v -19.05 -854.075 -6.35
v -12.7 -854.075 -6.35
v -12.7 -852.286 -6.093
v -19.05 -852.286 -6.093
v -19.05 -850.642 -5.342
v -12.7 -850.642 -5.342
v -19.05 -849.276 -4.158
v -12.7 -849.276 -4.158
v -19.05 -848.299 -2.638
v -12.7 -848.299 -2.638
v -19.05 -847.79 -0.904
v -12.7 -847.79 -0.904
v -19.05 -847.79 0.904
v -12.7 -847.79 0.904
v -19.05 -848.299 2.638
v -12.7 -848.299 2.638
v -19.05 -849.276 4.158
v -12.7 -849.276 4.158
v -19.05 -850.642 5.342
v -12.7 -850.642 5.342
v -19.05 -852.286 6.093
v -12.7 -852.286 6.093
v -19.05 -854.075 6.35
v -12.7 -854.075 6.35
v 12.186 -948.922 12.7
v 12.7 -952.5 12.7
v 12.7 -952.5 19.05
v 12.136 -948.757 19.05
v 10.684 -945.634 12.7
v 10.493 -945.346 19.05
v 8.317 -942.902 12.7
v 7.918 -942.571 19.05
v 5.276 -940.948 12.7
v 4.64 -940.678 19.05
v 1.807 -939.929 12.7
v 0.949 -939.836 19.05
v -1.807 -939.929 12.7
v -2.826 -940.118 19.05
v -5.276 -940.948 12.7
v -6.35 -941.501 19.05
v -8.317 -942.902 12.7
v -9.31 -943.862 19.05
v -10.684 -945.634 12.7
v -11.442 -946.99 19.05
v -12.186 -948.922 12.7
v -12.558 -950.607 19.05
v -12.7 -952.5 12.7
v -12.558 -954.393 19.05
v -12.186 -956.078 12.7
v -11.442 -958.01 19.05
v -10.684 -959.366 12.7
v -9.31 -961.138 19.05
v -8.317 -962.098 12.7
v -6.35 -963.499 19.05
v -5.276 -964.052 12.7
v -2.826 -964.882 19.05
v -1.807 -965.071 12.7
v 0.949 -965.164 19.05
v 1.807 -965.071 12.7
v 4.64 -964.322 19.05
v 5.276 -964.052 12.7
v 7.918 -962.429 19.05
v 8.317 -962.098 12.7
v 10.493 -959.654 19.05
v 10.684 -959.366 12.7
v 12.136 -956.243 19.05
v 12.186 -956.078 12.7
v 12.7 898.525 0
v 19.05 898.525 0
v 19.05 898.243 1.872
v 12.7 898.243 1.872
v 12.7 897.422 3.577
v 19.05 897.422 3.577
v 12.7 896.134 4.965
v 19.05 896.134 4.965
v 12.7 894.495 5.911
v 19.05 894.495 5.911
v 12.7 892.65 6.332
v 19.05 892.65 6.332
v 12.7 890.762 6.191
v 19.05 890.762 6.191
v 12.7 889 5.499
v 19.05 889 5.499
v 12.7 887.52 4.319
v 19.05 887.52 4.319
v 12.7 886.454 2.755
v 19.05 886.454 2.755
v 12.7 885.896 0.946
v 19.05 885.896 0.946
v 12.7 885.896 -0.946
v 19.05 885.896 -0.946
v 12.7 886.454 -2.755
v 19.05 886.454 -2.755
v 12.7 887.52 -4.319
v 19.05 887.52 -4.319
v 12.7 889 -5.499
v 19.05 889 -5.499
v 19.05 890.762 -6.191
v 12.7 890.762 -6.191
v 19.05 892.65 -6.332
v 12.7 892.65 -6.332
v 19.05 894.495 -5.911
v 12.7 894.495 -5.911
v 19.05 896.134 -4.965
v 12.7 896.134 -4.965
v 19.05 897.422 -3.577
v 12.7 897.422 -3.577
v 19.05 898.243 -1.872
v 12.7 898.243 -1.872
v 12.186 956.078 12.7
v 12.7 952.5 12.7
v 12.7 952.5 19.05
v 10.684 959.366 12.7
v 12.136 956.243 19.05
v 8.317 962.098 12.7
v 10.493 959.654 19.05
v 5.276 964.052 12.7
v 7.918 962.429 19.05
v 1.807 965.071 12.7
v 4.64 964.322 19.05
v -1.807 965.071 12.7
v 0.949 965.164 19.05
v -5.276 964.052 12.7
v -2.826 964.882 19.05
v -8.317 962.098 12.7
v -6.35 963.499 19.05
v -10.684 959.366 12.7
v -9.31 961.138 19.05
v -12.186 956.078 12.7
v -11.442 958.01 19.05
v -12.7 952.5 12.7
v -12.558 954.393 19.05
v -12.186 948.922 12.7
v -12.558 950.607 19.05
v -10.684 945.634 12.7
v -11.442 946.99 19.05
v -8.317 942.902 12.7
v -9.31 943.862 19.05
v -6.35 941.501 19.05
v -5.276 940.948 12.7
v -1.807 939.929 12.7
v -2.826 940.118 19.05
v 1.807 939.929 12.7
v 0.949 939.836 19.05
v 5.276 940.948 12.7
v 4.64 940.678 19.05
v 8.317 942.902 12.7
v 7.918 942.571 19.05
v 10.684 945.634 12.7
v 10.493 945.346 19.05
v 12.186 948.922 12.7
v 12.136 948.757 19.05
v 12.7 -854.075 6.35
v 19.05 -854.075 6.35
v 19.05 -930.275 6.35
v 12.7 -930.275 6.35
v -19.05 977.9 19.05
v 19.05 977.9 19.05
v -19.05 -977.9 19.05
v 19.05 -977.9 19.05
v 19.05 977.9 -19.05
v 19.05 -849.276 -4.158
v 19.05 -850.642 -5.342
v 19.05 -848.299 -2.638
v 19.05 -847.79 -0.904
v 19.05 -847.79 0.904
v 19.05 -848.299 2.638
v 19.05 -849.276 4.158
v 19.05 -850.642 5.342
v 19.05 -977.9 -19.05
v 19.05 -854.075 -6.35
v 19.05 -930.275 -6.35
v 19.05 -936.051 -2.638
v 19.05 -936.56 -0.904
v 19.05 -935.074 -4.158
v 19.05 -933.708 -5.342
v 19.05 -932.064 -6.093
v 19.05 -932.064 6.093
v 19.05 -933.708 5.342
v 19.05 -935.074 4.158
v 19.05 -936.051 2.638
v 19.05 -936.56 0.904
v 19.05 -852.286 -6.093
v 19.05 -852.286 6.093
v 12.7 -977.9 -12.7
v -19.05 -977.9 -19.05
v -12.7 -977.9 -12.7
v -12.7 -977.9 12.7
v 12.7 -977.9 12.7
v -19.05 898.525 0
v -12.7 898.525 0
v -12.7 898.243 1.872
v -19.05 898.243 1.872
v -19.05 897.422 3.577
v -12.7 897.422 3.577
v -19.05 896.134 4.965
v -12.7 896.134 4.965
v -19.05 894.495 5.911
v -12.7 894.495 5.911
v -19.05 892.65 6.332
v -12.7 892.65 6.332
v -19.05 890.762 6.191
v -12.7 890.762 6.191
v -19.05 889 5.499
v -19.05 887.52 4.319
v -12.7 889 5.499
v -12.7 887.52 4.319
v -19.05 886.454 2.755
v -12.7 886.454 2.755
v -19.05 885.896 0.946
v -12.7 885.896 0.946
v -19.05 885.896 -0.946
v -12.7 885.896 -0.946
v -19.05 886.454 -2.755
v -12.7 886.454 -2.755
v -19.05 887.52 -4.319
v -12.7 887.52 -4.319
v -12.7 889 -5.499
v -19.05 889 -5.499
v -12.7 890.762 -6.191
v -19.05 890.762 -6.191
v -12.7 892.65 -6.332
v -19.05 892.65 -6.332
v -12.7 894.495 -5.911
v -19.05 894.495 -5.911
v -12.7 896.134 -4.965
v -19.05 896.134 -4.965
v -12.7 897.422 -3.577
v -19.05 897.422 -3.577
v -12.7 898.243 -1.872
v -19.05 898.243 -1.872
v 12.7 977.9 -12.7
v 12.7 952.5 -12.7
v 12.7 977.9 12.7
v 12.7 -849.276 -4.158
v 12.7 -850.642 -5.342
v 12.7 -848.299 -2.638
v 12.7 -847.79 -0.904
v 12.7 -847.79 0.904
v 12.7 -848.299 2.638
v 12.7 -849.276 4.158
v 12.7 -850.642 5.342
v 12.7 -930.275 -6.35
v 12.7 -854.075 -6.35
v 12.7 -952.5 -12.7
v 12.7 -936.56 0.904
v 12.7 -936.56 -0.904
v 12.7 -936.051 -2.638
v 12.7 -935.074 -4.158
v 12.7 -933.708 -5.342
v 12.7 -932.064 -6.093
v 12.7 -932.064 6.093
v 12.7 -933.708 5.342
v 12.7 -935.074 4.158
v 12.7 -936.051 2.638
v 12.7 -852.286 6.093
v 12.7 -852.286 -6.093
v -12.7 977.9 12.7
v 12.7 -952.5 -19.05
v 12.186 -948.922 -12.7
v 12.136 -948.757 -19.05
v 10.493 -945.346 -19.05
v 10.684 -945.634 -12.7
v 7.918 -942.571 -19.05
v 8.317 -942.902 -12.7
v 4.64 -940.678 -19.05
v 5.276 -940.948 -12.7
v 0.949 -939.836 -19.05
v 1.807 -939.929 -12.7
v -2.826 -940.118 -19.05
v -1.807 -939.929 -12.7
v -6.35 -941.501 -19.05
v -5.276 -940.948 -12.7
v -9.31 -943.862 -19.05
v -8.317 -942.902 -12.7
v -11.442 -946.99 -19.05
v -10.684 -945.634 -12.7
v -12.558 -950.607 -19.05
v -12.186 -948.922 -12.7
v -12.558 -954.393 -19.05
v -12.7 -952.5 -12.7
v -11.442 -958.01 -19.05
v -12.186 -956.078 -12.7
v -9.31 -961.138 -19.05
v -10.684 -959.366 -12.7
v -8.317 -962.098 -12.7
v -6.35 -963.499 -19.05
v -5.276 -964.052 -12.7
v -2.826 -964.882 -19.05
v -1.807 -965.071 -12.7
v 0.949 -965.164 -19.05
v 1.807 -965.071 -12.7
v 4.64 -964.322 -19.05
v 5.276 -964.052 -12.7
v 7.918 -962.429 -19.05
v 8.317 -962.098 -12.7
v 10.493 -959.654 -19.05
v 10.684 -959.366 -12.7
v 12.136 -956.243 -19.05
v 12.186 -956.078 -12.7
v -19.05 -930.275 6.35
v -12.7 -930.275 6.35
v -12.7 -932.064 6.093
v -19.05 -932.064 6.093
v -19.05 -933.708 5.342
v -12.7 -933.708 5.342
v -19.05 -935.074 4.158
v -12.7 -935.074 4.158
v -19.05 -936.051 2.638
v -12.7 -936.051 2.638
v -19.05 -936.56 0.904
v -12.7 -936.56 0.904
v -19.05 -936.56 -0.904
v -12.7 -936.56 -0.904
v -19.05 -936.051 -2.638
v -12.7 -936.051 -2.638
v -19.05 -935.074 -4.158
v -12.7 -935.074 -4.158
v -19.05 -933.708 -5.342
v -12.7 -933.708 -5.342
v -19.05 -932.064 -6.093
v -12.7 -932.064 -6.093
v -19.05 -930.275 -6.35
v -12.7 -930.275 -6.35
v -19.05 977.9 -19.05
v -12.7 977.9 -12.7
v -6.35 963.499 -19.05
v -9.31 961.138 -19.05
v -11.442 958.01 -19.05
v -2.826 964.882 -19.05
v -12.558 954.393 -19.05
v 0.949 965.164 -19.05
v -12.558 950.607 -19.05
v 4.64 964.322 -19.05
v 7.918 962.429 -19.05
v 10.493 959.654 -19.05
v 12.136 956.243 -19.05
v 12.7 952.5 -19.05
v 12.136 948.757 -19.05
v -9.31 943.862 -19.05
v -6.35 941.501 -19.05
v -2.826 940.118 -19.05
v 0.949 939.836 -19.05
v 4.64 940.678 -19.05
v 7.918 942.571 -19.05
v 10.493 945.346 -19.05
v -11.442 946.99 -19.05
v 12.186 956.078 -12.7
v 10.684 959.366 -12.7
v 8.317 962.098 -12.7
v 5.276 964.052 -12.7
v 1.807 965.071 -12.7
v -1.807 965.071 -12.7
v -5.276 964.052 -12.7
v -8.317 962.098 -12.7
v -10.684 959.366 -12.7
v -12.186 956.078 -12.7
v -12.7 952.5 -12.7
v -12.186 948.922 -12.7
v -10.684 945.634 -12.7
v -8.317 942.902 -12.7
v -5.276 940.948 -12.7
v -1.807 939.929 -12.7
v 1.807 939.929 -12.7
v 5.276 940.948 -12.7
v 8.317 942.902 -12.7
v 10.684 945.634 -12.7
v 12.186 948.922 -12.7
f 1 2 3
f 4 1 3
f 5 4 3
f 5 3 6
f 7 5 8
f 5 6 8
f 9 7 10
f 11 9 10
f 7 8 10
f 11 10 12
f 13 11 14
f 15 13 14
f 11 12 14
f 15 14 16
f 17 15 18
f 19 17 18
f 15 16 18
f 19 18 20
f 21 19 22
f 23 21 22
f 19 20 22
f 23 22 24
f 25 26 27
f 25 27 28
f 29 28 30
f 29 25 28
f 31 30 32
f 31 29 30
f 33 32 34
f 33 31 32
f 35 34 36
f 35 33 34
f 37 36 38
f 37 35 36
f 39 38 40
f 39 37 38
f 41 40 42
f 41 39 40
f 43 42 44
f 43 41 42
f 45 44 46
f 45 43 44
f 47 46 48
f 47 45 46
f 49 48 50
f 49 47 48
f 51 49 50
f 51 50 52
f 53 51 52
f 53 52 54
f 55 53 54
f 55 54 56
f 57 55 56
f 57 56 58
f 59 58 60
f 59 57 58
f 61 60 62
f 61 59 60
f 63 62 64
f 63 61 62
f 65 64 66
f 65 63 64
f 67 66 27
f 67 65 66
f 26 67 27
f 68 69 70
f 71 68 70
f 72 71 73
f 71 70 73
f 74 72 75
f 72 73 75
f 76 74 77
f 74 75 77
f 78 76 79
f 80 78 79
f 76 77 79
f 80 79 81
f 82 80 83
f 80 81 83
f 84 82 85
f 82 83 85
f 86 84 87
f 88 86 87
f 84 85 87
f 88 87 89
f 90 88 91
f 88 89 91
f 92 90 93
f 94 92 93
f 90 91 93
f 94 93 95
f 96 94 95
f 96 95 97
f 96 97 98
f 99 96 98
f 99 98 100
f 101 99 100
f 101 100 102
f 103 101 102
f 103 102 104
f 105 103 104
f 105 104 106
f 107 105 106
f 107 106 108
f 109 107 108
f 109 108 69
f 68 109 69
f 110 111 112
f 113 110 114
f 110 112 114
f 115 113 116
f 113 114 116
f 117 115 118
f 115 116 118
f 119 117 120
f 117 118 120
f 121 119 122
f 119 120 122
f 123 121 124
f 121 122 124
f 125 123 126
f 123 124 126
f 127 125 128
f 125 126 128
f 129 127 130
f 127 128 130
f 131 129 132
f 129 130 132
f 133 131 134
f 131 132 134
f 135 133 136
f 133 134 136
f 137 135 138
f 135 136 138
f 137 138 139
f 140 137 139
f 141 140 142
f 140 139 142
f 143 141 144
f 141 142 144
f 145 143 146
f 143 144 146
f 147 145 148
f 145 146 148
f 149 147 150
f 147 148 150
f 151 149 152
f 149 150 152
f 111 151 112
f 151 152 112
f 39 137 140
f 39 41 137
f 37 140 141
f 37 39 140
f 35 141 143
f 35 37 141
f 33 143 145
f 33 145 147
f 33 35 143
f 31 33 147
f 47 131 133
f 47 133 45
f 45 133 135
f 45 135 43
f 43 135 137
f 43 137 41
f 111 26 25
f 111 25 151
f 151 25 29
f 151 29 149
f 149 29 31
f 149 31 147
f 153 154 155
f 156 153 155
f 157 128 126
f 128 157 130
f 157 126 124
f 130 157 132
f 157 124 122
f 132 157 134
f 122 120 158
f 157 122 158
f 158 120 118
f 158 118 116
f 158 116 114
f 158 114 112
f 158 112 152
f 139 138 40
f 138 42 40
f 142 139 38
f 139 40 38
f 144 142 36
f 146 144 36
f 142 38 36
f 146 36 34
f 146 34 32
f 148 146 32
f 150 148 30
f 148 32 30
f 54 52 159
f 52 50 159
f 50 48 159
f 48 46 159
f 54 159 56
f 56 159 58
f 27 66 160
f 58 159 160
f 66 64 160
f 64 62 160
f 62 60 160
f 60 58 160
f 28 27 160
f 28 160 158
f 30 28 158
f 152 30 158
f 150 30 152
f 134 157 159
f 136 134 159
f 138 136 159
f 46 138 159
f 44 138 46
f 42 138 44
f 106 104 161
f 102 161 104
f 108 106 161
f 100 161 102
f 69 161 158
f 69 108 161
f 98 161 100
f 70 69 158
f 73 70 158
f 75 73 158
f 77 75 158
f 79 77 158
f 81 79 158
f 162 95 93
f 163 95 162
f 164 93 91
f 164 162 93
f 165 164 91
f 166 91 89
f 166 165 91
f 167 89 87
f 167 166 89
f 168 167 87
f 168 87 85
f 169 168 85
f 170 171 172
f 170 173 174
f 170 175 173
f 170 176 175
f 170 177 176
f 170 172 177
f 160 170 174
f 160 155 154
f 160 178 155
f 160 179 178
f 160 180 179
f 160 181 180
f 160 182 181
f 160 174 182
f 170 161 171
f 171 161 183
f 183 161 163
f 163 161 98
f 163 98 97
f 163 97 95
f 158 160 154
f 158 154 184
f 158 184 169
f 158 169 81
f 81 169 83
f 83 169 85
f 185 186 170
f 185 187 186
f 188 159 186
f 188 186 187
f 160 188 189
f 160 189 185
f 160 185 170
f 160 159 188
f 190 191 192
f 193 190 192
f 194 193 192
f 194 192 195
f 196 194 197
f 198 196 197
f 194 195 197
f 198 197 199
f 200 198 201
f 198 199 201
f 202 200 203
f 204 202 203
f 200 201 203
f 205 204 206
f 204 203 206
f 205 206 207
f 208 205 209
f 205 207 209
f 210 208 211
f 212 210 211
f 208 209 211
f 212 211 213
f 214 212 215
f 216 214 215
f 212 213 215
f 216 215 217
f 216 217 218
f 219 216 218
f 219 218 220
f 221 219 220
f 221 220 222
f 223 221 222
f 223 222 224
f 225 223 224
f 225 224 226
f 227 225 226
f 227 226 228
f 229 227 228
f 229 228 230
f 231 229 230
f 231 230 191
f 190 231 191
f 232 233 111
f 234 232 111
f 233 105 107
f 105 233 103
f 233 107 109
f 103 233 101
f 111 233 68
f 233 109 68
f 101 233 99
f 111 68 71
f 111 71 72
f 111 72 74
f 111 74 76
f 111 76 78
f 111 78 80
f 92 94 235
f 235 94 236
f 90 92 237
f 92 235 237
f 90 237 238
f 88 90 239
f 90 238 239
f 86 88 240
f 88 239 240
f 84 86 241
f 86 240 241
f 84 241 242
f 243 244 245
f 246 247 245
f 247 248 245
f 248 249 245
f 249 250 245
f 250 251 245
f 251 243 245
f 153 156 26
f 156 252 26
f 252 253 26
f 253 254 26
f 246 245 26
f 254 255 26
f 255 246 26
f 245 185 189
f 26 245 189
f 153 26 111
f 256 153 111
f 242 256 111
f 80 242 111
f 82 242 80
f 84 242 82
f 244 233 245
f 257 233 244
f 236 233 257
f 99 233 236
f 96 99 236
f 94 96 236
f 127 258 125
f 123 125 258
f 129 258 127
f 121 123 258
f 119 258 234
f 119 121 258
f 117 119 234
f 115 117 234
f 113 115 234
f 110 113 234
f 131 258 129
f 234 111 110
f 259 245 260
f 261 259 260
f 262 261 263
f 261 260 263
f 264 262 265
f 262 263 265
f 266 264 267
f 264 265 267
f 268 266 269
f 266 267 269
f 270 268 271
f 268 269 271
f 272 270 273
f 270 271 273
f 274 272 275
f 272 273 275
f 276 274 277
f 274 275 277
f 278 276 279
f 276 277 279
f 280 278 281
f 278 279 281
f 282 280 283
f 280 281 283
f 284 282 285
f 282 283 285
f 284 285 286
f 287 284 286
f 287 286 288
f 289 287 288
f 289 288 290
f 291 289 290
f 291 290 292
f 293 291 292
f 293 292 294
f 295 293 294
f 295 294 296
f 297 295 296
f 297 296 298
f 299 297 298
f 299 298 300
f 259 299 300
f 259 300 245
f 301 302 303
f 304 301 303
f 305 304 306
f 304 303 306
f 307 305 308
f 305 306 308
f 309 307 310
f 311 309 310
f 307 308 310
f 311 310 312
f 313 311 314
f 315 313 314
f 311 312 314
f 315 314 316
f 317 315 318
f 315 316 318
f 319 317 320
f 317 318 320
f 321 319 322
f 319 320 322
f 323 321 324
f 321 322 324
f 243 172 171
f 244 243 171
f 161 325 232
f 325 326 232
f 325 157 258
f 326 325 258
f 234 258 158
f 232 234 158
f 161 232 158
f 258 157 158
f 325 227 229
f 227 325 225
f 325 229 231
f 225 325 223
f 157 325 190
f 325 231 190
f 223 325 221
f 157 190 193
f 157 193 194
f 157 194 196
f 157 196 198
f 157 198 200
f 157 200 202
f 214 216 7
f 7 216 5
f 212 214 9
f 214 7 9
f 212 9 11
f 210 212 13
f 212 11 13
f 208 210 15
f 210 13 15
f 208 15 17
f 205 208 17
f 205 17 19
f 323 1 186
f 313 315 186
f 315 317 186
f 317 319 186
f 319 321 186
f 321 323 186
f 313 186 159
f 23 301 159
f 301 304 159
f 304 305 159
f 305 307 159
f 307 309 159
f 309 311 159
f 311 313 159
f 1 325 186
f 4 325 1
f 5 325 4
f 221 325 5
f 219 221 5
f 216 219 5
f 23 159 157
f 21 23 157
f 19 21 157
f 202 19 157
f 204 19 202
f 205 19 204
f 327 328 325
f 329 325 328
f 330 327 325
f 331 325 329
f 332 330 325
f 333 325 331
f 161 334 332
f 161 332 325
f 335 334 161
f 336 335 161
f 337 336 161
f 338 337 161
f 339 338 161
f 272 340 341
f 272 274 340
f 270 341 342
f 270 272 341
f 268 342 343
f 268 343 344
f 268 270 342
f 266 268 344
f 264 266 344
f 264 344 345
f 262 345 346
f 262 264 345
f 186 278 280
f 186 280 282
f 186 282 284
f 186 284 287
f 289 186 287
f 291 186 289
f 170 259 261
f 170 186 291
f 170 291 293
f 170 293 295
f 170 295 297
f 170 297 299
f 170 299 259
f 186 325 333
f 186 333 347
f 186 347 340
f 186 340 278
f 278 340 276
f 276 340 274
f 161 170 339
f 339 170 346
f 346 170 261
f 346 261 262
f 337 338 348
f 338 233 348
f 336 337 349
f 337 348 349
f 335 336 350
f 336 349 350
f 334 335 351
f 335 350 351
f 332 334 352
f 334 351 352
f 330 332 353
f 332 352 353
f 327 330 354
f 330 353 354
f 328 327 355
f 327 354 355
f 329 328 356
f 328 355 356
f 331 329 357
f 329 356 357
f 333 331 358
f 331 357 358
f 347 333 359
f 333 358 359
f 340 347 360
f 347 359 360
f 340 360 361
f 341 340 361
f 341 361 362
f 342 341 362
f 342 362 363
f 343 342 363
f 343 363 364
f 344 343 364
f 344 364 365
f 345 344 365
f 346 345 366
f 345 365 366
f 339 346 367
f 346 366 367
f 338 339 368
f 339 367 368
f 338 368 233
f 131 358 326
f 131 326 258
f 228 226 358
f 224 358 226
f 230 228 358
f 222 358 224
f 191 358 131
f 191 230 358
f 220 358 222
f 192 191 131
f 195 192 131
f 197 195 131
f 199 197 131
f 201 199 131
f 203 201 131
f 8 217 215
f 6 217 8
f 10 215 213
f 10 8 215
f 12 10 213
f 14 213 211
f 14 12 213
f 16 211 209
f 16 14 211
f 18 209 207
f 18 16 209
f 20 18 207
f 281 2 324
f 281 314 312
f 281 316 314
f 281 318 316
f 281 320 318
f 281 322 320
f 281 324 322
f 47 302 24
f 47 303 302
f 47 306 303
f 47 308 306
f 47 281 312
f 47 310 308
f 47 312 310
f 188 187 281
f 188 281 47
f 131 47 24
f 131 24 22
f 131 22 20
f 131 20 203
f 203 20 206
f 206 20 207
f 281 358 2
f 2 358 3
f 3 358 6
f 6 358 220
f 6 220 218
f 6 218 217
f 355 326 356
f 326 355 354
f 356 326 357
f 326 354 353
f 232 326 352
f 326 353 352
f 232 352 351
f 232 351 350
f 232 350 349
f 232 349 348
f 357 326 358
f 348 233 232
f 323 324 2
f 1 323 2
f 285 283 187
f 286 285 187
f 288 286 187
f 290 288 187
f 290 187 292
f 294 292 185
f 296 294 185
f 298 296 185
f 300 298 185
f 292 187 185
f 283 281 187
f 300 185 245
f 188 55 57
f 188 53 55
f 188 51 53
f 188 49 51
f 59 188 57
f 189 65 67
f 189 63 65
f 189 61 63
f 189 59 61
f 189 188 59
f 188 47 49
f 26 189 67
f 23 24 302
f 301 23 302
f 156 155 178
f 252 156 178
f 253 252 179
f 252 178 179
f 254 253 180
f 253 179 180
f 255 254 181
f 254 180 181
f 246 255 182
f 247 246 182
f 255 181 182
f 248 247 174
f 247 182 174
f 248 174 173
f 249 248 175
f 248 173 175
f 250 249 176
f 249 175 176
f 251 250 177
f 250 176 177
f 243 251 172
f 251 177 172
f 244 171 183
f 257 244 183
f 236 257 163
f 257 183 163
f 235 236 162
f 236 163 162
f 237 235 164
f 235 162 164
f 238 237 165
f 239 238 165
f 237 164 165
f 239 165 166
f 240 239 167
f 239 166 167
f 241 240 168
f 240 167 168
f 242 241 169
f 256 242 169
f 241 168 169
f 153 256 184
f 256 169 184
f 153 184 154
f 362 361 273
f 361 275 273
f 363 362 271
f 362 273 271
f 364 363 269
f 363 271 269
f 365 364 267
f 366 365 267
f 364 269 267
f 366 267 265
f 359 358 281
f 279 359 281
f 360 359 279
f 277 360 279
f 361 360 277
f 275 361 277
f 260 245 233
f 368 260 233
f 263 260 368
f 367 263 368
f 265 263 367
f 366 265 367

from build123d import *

# Parameters (mm, degrees)
F0_W     = 38.1
F0_H     = 38.1
F0_W_2   = 25.4
F0_H_2   = 25.4
F1_DEPTH = 977.9
F2_R     = 12.7
F3_DEPTH = 317.5
F4_R     = 6.35
F5_DEPTH = 76.2
F7_DEPTH = 50.8


with BuildPart() as f1:
    # F0 (on Front) → F1 (new body, symmetric)
    with BuildSketch(Plane.XZ):
        Rectangle(F0_W, F0_H)
        Rectangle(F0_W_2, F0_H_2, mode=Mode.SUBTRACT)
    extrude(amount=F1_DEPTH, both=True)

    # F2 (on Top) → F3 (cut, symmetric)
    with BuildSketch(Plane.XY):
        with Locations((0, -952.5)):
            Circle(F2_R)
        with Locations((0, 952.5)):
            Circle(F2_R)
    extrude(amount=F3_DEPTH, both=True, mode=Mode.SUBTRACT)

    # F4 (on face) → F5 (cut)
    with BuildSketch(Plane.YZ.offset(19.05)):
        with Locations((892.175, 0)):
            Circle(F4_R)
    extrude(amount=-F5_DEPTH, mode=Mode.SUBTRACT)

    # F6 (on face) → F7 (cut)
    with BuildSketch(Plane.YZ.offset(19.05)):
        with BuildLine():
            Line((-854.075, 6.35), (-930.275, 6.35))
            ThreePointArc((-930.275, 6.35), (-936.625, 0), (-930.275, -6.35))
            Line((-930.275, -6.35), (-854.075, -6.35))
            ThreePointArc((-854.075, -6.35), (-847.725, 0), (-854.075, 6.35))
        make_face()
    extrude(amount=-F7_DEPTH, mode=Mode.SUBTRACT)


solid = f1.part
